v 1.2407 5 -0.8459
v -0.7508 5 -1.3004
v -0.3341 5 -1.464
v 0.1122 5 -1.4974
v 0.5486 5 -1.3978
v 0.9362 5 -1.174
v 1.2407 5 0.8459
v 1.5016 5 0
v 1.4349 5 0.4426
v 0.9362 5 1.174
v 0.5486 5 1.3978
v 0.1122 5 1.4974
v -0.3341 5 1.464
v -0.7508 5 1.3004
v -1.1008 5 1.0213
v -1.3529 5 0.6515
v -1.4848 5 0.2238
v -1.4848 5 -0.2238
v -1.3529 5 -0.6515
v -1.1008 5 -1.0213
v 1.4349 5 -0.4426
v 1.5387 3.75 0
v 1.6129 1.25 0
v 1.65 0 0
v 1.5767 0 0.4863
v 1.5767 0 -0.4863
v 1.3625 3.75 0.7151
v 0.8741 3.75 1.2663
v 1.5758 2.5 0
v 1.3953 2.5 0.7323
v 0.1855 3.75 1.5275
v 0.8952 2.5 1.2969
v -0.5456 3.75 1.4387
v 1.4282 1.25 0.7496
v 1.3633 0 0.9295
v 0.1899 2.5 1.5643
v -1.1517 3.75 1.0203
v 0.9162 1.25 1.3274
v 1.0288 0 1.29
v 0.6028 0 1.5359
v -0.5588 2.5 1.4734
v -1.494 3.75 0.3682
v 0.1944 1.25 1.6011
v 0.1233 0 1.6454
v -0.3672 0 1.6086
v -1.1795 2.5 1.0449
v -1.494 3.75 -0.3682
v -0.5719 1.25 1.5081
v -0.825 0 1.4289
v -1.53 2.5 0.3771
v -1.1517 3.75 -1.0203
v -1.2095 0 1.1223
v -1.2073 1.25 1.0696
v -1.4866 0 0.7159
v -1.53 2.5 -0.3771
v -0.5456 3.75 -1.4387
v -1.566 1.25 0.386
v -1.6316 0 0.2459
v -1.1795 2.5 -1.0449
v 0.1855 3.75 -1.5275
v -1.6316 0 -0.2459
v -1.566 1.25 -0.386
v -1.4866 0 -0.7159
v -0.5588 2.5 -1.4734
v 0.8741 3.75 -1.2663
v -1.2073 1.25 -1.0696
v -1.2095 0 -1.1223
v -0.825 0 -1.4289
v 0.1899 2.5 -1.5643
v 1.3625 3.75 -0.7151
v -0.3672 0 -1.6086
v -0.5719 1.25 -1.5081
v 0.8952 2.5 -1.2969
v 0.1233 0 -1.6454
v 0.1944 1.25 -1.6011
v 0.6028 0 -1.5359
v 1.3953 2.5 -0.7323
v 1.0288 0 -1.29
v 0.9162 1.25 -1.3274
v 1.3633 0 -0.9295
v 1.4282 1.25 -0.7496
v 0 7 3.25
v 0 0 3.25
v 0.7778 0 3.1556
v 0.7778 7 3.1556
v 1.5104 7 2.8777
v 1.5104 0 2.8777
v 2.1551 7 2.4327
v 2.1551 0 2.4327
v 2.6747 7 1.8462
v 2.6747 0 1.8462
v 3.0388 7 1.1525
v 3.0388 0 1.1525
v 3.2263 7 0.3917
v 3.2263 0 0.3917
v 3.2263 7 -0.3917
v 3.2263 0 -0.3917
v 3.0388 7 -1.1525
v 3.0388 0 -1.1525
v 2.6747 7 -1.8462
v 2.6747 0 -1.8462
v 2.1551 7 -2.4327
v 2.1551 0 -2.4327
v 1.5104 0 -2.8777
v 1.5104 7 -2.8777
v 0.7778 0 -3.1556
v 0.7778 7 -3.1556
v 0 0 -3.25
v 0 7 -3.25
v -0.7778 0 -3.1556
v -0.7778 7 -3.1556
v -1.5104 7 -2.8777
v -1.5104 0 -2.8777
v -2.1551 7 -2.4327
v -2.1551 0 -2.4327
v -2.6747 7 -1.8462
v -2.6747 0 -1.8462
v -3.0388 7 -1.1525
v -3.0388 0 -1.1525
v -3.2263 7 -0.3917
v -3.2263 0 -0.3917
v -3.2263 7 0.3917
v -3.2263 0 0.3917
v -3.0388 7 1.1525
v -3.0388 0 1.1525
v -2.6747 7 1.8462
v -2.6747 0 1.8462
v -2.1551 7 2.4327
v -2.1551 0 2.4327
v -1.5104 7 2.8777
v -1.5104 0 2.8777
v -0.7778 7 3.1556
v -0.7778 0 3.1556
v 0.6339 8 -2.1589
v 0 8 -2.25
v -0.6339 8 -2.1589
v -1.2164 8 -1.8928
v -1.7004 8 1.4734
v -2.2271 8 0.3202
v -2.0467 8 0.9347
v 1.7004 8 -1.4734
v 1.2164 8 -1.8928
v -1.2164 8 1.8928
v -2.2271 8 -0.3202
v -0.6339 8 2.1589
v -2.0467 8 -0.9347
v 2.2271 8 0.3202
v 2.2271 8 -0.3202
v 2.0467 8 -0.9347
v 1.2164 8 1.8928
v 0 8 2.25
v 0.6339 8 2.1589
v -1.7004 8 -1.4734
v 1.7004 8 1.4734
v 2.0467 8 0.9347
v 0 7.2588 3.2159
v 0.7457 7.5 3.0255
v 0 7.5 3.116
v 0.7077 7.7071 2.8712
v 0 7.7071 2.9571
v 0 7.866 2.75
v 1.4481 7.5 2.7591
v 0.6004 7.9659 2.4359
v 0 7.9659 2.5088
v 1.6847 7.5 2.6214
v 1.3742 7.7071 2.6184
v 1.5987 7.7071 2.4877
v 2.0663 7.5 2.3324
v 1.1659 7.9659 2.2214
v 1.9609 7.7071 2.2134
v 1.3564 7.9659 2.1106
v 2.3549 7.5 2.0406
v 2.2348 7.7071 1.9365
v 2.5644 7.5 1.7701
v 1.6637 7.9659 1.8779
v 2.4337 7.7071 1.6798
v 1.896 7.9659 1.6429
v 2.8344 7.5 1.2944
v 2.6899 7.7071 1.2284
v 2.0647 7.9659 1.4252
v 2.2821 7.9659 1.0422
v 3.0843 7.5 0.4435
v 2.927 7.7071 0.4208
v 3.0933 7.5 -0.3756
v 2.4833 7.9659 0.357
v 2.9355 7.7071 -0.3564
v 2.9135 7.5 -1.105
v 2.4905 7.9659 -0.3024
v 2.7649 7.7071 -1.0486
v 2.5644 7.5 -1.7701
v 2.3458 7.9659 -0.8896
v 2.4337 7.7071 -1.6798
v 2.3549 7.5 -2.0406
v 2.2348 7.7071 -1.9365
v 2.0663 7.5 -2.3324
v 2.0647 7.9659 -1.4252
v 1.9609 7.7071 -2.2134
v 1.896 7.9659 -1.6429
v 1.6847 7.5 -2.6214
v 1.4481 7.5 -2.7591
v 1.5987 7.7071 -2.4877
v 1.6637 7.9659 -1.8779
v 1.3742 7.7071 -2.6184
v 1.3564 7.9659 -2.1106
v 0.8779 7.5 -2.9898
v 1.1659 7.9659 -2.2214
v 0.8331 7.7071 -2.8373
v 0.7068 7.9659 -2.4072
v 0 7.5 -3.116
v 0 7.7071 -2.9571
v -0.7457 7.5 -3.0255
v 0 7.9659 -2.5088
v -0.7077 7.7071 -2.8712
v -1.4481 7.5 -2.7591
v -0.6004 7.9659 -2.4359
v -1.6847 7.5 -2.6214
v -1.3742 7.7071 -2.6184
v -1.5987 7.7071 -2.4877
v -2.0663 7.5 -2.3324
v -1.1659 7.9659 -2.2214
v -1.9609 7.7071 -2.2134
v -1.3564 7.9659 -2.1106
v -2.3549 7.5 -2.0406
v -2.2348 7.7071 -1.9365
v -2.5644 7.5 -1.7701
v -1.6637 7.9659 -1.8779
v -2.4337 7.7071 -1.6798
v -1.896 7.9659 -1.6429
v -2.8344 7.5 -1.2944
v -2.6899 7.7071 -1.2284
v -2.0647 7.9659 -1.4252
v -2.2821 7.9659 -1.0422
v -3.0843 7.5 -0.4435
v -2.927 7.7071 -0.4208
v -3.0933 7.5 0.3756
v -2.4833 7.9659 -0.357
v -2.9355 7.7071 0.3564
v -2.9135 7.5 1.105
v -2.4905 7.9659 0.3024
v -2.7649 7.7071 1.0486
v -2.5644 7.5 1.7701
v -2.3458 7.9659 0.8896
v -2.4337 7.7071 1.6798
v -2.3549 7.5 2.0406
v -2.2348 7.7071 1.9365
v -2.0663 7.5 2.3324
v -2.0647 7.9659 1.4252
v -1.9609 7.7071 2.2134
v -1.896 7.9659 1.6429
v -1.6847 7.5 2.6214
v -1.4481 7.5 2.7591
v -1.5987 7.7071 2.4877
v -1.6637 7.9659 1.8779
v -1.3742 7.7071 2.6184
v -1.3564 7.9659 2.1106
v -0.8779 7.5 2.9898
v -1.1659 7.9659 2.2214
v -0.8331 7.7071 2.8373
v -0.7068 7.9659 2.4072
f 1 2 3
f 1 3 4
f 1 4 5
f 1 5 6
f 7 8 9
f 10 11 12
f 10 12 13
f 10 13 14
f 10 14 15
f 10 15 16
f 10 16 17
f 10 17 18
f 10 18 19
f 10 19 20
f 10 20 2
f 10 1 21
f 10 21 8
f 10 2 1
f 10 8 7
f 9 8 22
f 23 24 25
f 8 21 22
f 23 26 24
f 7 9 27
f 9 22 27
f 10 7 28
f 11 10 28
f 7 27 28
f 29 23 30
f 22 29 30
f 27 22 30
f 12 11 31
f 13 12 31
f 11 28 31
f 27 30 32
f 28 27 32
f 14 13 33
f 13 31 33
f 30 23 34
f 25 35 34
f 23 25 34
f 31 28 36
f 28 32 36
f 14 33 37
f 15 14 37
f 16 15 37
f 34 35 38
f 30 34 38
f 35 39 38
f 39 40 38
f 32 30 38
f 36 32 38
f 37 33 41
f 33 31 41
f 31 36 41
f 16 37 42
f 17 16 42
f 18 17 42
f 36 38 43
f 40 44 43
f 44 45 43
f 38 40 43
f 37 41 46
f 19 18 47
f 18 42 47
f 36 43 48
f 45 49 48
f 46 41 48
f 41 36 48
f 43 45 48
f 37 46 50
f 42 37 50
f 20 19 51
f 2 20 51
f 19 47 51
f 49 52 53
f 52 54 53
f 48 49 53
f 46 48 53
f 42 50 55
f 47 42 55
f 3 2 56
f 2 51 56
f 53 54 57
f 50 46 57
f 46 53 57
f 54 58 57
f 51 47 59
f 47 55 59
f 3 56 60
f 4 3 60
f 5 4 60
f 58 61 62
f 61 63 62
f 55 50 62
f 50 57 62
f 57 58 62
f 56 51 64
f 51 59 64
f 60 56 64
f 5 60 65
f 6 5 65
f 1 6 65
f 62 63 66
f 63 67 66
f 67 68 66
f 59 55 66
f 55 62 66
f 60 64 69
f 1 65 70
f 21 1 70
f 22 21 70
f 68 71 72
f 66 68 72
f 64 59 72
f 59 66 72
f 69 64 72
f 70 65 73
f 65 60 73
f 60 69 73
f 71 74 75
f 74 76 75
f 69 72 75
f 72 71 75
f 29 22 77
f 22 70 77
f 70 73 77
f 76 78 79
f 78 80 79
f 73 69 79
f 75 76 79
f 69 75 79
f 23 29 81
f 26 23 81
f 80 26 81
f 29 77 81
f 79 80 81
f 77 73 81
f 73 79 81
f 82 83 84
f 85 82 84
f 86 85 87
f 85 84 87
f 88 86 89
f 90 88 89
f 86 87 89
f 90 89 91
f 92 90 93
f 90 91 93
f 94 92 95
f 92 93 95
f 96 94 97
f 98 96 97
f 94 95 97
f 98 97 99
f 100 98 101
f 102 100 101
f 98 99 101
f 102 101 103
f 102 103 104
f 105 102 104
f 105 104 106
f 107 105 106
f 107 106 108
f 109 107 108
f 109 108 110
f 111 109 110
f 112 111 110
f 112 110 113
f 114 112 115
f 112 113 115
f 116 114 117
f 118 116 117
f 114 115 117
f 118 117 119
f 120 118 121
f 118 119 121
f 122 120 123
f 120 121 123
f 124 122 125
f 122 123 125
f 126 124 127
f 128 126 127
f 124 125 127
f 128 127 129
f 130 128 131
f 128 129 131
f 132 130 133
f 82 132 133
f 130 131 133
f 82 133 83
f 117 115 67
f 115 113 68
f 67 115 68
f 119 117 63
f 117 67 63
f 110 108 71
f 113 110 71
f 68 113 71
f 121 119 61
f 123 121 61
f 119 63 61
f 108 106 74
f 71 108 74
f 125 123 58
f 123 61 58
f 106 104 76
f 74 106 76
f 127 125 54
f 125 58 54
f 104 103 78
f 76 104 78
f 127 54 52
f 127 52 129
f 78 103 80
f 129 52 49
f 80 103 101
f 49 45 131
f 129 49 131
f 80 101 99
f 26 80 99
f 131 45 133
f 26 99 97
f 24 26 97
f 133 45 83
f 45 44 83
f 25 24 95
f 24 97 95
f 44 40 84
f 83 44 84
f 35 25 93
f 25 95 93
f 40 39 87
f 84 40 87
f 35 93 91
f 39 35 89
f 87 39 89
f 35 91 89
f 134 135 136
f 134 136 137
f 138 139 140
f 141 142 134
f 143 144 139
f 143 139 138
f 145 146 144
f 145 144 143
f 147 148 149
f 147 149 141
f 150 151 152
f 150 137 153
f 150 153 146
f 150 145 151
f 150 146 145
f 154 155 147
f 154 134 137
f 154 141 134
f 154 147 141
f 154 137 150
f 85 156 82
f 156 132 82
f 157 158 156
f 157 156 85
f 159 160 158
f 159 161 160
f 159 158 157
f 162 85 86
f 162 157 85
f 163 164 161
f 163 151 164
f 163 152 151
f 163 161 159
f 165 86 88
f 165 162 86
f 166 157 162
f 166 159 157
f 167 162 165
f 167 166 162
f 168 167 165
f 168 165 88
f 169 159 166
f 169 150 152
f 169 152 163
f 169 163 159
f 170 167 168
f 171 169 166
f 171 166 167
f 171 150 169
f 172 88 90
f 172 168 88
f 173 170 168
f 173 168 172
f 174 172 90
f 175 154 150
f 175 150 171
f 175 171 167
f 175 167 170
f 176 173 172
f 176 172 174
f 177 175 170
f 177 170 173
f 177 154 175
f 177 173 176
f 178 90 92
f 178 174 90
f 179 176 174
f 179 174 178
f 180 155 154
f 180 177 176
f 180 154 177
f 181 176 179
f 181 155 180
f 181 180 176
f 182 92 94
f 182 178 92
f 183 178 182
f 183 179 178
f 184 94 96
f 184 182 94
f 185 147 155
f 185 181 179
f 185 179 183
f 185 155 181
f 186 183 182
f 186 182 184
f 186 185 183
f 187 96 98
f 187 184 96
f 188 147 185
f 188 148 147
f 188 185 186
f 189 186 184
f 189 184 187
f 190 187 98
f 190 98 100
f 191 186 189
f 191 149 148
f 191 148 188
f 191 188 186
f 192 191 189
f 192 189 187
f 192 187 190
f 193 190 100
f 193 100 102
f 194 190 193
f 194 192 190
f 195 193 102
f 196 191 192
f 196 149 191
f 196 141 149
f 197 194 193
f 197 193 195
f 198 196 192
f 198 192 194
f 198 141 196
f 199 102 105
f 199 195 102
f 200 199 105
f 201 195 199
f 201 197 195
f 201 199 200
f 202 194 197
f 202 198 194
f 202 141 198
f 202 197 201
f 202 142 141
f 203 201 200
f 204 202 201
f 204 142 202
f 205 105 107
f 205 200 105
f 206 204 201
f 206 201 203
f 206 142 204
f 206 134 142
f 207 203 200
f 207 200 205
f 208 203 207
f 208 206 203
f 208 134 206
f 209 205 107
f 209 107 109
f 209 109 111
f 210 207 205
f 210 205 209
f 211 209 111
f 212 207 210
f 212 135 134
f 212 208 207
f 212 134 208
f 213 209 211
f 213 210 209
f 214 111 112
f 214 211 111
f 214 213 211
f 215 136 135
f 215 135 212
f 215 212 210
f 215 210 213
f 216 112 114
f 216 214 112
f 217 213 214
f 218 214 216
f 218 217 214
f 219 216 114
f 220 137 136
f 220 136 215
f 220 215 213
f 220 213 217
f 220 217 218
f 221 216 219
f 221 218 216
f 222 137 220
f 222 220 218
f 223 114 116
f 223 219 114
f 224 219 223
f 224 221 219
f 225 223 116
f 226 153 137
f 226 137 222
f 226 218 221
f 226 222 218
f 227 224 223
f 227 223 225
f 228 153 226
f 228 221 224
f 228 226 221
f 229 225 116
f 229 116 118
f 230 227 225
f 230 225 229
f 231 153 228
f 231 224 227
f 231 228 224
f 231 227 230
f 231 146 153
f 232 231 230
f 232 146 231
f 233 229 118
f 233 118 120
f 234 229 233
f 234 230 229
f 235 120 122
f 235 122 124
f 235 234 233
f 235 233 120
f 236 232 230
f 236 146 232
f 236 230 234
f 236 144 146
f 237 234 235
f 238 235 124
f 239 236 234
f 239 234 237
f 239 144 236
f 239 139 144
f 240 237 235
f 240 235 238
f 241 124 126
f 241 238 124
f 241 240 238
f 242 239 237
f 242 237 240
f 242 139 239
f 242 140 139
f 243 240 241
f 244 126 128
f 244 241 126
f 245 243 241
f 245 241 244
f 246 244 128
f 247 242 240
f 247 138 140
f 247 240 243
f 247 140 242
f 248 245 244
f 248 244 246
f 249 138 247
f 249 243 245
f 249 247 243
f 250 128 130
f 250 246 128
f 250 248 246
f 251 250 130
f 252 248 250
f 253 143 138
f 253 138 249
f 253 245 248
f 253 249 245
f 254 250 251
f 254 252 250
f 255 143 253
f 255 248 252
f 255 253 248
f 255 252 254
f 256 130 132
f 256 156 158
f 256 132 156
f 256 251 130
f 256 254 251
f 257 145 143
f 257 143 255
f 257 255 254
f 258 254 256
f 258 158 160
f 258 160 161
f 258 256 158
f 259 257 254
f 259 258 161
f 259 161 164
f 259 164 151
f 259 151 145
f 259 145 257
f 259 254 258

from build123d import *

# Parameters (mm, degrees)
SKETCH1_R           = 3.25
BOSS_EXTRUDE1_DEPTH = 8
FILLET1_R           = 1
SKETCH2_R           = 1.65
CUT_EXTRUDE1_DEPTH  = 5
CUT_EXTRUDE1_DRAFT  = -1.7


with BuildPart() as part:
    # Sketch1 → Boss-Extrude1 (new body)
    with BuildSketch(Plane(origin=(0, 0, 0), x_dir=(1, 0, 0), z_dir=(0, 1, 0))):
        with Locations(Location((0, 0, 0), (0, 0, 270))):
            Circle(SKETCH1_R)
    extrude(amount=BOSS_EXTRUDE1_DEPTH)

    # Fillet1
    fillet1_edges = [part.edges().sort_by_distance(p)[0] for p in [
        (0, 8, -3.25),
    ]]
    fillet(fillet1_edges, radius=FILLET1_R)


with BuildPart() as cut_extrude1_tool:
    # Sketch2 → Cut-Extrude1 (with draft: the straight prism first)
    with BuildSketch(Plane.XZ):
        Circle(SKETCH2_R)
    extrude(amount=-CUT_EXTRUDE1_DEPTH)
    # Cut-Extrude1: the draft: its side faces are tilted about the plane it starts from
    cut_extrude1_sides = [cut_extrude1_tool.faces().sort_by_distance(p)[0] for p in [
        (-1.65, 2.5, 0),
    ]]
    draft(cut_extrude1_sides, Plane.XZ, CUT_EXTRUDE1_DRAFT)


with BuildPart() as part_1:
    add(part.part)

    # Cut-Extrude1: cut by cut_extrude1_tool
    add(cut_extrude1_tool.part, mode=Mode.SUBTRACT)


solid = part_1.part
